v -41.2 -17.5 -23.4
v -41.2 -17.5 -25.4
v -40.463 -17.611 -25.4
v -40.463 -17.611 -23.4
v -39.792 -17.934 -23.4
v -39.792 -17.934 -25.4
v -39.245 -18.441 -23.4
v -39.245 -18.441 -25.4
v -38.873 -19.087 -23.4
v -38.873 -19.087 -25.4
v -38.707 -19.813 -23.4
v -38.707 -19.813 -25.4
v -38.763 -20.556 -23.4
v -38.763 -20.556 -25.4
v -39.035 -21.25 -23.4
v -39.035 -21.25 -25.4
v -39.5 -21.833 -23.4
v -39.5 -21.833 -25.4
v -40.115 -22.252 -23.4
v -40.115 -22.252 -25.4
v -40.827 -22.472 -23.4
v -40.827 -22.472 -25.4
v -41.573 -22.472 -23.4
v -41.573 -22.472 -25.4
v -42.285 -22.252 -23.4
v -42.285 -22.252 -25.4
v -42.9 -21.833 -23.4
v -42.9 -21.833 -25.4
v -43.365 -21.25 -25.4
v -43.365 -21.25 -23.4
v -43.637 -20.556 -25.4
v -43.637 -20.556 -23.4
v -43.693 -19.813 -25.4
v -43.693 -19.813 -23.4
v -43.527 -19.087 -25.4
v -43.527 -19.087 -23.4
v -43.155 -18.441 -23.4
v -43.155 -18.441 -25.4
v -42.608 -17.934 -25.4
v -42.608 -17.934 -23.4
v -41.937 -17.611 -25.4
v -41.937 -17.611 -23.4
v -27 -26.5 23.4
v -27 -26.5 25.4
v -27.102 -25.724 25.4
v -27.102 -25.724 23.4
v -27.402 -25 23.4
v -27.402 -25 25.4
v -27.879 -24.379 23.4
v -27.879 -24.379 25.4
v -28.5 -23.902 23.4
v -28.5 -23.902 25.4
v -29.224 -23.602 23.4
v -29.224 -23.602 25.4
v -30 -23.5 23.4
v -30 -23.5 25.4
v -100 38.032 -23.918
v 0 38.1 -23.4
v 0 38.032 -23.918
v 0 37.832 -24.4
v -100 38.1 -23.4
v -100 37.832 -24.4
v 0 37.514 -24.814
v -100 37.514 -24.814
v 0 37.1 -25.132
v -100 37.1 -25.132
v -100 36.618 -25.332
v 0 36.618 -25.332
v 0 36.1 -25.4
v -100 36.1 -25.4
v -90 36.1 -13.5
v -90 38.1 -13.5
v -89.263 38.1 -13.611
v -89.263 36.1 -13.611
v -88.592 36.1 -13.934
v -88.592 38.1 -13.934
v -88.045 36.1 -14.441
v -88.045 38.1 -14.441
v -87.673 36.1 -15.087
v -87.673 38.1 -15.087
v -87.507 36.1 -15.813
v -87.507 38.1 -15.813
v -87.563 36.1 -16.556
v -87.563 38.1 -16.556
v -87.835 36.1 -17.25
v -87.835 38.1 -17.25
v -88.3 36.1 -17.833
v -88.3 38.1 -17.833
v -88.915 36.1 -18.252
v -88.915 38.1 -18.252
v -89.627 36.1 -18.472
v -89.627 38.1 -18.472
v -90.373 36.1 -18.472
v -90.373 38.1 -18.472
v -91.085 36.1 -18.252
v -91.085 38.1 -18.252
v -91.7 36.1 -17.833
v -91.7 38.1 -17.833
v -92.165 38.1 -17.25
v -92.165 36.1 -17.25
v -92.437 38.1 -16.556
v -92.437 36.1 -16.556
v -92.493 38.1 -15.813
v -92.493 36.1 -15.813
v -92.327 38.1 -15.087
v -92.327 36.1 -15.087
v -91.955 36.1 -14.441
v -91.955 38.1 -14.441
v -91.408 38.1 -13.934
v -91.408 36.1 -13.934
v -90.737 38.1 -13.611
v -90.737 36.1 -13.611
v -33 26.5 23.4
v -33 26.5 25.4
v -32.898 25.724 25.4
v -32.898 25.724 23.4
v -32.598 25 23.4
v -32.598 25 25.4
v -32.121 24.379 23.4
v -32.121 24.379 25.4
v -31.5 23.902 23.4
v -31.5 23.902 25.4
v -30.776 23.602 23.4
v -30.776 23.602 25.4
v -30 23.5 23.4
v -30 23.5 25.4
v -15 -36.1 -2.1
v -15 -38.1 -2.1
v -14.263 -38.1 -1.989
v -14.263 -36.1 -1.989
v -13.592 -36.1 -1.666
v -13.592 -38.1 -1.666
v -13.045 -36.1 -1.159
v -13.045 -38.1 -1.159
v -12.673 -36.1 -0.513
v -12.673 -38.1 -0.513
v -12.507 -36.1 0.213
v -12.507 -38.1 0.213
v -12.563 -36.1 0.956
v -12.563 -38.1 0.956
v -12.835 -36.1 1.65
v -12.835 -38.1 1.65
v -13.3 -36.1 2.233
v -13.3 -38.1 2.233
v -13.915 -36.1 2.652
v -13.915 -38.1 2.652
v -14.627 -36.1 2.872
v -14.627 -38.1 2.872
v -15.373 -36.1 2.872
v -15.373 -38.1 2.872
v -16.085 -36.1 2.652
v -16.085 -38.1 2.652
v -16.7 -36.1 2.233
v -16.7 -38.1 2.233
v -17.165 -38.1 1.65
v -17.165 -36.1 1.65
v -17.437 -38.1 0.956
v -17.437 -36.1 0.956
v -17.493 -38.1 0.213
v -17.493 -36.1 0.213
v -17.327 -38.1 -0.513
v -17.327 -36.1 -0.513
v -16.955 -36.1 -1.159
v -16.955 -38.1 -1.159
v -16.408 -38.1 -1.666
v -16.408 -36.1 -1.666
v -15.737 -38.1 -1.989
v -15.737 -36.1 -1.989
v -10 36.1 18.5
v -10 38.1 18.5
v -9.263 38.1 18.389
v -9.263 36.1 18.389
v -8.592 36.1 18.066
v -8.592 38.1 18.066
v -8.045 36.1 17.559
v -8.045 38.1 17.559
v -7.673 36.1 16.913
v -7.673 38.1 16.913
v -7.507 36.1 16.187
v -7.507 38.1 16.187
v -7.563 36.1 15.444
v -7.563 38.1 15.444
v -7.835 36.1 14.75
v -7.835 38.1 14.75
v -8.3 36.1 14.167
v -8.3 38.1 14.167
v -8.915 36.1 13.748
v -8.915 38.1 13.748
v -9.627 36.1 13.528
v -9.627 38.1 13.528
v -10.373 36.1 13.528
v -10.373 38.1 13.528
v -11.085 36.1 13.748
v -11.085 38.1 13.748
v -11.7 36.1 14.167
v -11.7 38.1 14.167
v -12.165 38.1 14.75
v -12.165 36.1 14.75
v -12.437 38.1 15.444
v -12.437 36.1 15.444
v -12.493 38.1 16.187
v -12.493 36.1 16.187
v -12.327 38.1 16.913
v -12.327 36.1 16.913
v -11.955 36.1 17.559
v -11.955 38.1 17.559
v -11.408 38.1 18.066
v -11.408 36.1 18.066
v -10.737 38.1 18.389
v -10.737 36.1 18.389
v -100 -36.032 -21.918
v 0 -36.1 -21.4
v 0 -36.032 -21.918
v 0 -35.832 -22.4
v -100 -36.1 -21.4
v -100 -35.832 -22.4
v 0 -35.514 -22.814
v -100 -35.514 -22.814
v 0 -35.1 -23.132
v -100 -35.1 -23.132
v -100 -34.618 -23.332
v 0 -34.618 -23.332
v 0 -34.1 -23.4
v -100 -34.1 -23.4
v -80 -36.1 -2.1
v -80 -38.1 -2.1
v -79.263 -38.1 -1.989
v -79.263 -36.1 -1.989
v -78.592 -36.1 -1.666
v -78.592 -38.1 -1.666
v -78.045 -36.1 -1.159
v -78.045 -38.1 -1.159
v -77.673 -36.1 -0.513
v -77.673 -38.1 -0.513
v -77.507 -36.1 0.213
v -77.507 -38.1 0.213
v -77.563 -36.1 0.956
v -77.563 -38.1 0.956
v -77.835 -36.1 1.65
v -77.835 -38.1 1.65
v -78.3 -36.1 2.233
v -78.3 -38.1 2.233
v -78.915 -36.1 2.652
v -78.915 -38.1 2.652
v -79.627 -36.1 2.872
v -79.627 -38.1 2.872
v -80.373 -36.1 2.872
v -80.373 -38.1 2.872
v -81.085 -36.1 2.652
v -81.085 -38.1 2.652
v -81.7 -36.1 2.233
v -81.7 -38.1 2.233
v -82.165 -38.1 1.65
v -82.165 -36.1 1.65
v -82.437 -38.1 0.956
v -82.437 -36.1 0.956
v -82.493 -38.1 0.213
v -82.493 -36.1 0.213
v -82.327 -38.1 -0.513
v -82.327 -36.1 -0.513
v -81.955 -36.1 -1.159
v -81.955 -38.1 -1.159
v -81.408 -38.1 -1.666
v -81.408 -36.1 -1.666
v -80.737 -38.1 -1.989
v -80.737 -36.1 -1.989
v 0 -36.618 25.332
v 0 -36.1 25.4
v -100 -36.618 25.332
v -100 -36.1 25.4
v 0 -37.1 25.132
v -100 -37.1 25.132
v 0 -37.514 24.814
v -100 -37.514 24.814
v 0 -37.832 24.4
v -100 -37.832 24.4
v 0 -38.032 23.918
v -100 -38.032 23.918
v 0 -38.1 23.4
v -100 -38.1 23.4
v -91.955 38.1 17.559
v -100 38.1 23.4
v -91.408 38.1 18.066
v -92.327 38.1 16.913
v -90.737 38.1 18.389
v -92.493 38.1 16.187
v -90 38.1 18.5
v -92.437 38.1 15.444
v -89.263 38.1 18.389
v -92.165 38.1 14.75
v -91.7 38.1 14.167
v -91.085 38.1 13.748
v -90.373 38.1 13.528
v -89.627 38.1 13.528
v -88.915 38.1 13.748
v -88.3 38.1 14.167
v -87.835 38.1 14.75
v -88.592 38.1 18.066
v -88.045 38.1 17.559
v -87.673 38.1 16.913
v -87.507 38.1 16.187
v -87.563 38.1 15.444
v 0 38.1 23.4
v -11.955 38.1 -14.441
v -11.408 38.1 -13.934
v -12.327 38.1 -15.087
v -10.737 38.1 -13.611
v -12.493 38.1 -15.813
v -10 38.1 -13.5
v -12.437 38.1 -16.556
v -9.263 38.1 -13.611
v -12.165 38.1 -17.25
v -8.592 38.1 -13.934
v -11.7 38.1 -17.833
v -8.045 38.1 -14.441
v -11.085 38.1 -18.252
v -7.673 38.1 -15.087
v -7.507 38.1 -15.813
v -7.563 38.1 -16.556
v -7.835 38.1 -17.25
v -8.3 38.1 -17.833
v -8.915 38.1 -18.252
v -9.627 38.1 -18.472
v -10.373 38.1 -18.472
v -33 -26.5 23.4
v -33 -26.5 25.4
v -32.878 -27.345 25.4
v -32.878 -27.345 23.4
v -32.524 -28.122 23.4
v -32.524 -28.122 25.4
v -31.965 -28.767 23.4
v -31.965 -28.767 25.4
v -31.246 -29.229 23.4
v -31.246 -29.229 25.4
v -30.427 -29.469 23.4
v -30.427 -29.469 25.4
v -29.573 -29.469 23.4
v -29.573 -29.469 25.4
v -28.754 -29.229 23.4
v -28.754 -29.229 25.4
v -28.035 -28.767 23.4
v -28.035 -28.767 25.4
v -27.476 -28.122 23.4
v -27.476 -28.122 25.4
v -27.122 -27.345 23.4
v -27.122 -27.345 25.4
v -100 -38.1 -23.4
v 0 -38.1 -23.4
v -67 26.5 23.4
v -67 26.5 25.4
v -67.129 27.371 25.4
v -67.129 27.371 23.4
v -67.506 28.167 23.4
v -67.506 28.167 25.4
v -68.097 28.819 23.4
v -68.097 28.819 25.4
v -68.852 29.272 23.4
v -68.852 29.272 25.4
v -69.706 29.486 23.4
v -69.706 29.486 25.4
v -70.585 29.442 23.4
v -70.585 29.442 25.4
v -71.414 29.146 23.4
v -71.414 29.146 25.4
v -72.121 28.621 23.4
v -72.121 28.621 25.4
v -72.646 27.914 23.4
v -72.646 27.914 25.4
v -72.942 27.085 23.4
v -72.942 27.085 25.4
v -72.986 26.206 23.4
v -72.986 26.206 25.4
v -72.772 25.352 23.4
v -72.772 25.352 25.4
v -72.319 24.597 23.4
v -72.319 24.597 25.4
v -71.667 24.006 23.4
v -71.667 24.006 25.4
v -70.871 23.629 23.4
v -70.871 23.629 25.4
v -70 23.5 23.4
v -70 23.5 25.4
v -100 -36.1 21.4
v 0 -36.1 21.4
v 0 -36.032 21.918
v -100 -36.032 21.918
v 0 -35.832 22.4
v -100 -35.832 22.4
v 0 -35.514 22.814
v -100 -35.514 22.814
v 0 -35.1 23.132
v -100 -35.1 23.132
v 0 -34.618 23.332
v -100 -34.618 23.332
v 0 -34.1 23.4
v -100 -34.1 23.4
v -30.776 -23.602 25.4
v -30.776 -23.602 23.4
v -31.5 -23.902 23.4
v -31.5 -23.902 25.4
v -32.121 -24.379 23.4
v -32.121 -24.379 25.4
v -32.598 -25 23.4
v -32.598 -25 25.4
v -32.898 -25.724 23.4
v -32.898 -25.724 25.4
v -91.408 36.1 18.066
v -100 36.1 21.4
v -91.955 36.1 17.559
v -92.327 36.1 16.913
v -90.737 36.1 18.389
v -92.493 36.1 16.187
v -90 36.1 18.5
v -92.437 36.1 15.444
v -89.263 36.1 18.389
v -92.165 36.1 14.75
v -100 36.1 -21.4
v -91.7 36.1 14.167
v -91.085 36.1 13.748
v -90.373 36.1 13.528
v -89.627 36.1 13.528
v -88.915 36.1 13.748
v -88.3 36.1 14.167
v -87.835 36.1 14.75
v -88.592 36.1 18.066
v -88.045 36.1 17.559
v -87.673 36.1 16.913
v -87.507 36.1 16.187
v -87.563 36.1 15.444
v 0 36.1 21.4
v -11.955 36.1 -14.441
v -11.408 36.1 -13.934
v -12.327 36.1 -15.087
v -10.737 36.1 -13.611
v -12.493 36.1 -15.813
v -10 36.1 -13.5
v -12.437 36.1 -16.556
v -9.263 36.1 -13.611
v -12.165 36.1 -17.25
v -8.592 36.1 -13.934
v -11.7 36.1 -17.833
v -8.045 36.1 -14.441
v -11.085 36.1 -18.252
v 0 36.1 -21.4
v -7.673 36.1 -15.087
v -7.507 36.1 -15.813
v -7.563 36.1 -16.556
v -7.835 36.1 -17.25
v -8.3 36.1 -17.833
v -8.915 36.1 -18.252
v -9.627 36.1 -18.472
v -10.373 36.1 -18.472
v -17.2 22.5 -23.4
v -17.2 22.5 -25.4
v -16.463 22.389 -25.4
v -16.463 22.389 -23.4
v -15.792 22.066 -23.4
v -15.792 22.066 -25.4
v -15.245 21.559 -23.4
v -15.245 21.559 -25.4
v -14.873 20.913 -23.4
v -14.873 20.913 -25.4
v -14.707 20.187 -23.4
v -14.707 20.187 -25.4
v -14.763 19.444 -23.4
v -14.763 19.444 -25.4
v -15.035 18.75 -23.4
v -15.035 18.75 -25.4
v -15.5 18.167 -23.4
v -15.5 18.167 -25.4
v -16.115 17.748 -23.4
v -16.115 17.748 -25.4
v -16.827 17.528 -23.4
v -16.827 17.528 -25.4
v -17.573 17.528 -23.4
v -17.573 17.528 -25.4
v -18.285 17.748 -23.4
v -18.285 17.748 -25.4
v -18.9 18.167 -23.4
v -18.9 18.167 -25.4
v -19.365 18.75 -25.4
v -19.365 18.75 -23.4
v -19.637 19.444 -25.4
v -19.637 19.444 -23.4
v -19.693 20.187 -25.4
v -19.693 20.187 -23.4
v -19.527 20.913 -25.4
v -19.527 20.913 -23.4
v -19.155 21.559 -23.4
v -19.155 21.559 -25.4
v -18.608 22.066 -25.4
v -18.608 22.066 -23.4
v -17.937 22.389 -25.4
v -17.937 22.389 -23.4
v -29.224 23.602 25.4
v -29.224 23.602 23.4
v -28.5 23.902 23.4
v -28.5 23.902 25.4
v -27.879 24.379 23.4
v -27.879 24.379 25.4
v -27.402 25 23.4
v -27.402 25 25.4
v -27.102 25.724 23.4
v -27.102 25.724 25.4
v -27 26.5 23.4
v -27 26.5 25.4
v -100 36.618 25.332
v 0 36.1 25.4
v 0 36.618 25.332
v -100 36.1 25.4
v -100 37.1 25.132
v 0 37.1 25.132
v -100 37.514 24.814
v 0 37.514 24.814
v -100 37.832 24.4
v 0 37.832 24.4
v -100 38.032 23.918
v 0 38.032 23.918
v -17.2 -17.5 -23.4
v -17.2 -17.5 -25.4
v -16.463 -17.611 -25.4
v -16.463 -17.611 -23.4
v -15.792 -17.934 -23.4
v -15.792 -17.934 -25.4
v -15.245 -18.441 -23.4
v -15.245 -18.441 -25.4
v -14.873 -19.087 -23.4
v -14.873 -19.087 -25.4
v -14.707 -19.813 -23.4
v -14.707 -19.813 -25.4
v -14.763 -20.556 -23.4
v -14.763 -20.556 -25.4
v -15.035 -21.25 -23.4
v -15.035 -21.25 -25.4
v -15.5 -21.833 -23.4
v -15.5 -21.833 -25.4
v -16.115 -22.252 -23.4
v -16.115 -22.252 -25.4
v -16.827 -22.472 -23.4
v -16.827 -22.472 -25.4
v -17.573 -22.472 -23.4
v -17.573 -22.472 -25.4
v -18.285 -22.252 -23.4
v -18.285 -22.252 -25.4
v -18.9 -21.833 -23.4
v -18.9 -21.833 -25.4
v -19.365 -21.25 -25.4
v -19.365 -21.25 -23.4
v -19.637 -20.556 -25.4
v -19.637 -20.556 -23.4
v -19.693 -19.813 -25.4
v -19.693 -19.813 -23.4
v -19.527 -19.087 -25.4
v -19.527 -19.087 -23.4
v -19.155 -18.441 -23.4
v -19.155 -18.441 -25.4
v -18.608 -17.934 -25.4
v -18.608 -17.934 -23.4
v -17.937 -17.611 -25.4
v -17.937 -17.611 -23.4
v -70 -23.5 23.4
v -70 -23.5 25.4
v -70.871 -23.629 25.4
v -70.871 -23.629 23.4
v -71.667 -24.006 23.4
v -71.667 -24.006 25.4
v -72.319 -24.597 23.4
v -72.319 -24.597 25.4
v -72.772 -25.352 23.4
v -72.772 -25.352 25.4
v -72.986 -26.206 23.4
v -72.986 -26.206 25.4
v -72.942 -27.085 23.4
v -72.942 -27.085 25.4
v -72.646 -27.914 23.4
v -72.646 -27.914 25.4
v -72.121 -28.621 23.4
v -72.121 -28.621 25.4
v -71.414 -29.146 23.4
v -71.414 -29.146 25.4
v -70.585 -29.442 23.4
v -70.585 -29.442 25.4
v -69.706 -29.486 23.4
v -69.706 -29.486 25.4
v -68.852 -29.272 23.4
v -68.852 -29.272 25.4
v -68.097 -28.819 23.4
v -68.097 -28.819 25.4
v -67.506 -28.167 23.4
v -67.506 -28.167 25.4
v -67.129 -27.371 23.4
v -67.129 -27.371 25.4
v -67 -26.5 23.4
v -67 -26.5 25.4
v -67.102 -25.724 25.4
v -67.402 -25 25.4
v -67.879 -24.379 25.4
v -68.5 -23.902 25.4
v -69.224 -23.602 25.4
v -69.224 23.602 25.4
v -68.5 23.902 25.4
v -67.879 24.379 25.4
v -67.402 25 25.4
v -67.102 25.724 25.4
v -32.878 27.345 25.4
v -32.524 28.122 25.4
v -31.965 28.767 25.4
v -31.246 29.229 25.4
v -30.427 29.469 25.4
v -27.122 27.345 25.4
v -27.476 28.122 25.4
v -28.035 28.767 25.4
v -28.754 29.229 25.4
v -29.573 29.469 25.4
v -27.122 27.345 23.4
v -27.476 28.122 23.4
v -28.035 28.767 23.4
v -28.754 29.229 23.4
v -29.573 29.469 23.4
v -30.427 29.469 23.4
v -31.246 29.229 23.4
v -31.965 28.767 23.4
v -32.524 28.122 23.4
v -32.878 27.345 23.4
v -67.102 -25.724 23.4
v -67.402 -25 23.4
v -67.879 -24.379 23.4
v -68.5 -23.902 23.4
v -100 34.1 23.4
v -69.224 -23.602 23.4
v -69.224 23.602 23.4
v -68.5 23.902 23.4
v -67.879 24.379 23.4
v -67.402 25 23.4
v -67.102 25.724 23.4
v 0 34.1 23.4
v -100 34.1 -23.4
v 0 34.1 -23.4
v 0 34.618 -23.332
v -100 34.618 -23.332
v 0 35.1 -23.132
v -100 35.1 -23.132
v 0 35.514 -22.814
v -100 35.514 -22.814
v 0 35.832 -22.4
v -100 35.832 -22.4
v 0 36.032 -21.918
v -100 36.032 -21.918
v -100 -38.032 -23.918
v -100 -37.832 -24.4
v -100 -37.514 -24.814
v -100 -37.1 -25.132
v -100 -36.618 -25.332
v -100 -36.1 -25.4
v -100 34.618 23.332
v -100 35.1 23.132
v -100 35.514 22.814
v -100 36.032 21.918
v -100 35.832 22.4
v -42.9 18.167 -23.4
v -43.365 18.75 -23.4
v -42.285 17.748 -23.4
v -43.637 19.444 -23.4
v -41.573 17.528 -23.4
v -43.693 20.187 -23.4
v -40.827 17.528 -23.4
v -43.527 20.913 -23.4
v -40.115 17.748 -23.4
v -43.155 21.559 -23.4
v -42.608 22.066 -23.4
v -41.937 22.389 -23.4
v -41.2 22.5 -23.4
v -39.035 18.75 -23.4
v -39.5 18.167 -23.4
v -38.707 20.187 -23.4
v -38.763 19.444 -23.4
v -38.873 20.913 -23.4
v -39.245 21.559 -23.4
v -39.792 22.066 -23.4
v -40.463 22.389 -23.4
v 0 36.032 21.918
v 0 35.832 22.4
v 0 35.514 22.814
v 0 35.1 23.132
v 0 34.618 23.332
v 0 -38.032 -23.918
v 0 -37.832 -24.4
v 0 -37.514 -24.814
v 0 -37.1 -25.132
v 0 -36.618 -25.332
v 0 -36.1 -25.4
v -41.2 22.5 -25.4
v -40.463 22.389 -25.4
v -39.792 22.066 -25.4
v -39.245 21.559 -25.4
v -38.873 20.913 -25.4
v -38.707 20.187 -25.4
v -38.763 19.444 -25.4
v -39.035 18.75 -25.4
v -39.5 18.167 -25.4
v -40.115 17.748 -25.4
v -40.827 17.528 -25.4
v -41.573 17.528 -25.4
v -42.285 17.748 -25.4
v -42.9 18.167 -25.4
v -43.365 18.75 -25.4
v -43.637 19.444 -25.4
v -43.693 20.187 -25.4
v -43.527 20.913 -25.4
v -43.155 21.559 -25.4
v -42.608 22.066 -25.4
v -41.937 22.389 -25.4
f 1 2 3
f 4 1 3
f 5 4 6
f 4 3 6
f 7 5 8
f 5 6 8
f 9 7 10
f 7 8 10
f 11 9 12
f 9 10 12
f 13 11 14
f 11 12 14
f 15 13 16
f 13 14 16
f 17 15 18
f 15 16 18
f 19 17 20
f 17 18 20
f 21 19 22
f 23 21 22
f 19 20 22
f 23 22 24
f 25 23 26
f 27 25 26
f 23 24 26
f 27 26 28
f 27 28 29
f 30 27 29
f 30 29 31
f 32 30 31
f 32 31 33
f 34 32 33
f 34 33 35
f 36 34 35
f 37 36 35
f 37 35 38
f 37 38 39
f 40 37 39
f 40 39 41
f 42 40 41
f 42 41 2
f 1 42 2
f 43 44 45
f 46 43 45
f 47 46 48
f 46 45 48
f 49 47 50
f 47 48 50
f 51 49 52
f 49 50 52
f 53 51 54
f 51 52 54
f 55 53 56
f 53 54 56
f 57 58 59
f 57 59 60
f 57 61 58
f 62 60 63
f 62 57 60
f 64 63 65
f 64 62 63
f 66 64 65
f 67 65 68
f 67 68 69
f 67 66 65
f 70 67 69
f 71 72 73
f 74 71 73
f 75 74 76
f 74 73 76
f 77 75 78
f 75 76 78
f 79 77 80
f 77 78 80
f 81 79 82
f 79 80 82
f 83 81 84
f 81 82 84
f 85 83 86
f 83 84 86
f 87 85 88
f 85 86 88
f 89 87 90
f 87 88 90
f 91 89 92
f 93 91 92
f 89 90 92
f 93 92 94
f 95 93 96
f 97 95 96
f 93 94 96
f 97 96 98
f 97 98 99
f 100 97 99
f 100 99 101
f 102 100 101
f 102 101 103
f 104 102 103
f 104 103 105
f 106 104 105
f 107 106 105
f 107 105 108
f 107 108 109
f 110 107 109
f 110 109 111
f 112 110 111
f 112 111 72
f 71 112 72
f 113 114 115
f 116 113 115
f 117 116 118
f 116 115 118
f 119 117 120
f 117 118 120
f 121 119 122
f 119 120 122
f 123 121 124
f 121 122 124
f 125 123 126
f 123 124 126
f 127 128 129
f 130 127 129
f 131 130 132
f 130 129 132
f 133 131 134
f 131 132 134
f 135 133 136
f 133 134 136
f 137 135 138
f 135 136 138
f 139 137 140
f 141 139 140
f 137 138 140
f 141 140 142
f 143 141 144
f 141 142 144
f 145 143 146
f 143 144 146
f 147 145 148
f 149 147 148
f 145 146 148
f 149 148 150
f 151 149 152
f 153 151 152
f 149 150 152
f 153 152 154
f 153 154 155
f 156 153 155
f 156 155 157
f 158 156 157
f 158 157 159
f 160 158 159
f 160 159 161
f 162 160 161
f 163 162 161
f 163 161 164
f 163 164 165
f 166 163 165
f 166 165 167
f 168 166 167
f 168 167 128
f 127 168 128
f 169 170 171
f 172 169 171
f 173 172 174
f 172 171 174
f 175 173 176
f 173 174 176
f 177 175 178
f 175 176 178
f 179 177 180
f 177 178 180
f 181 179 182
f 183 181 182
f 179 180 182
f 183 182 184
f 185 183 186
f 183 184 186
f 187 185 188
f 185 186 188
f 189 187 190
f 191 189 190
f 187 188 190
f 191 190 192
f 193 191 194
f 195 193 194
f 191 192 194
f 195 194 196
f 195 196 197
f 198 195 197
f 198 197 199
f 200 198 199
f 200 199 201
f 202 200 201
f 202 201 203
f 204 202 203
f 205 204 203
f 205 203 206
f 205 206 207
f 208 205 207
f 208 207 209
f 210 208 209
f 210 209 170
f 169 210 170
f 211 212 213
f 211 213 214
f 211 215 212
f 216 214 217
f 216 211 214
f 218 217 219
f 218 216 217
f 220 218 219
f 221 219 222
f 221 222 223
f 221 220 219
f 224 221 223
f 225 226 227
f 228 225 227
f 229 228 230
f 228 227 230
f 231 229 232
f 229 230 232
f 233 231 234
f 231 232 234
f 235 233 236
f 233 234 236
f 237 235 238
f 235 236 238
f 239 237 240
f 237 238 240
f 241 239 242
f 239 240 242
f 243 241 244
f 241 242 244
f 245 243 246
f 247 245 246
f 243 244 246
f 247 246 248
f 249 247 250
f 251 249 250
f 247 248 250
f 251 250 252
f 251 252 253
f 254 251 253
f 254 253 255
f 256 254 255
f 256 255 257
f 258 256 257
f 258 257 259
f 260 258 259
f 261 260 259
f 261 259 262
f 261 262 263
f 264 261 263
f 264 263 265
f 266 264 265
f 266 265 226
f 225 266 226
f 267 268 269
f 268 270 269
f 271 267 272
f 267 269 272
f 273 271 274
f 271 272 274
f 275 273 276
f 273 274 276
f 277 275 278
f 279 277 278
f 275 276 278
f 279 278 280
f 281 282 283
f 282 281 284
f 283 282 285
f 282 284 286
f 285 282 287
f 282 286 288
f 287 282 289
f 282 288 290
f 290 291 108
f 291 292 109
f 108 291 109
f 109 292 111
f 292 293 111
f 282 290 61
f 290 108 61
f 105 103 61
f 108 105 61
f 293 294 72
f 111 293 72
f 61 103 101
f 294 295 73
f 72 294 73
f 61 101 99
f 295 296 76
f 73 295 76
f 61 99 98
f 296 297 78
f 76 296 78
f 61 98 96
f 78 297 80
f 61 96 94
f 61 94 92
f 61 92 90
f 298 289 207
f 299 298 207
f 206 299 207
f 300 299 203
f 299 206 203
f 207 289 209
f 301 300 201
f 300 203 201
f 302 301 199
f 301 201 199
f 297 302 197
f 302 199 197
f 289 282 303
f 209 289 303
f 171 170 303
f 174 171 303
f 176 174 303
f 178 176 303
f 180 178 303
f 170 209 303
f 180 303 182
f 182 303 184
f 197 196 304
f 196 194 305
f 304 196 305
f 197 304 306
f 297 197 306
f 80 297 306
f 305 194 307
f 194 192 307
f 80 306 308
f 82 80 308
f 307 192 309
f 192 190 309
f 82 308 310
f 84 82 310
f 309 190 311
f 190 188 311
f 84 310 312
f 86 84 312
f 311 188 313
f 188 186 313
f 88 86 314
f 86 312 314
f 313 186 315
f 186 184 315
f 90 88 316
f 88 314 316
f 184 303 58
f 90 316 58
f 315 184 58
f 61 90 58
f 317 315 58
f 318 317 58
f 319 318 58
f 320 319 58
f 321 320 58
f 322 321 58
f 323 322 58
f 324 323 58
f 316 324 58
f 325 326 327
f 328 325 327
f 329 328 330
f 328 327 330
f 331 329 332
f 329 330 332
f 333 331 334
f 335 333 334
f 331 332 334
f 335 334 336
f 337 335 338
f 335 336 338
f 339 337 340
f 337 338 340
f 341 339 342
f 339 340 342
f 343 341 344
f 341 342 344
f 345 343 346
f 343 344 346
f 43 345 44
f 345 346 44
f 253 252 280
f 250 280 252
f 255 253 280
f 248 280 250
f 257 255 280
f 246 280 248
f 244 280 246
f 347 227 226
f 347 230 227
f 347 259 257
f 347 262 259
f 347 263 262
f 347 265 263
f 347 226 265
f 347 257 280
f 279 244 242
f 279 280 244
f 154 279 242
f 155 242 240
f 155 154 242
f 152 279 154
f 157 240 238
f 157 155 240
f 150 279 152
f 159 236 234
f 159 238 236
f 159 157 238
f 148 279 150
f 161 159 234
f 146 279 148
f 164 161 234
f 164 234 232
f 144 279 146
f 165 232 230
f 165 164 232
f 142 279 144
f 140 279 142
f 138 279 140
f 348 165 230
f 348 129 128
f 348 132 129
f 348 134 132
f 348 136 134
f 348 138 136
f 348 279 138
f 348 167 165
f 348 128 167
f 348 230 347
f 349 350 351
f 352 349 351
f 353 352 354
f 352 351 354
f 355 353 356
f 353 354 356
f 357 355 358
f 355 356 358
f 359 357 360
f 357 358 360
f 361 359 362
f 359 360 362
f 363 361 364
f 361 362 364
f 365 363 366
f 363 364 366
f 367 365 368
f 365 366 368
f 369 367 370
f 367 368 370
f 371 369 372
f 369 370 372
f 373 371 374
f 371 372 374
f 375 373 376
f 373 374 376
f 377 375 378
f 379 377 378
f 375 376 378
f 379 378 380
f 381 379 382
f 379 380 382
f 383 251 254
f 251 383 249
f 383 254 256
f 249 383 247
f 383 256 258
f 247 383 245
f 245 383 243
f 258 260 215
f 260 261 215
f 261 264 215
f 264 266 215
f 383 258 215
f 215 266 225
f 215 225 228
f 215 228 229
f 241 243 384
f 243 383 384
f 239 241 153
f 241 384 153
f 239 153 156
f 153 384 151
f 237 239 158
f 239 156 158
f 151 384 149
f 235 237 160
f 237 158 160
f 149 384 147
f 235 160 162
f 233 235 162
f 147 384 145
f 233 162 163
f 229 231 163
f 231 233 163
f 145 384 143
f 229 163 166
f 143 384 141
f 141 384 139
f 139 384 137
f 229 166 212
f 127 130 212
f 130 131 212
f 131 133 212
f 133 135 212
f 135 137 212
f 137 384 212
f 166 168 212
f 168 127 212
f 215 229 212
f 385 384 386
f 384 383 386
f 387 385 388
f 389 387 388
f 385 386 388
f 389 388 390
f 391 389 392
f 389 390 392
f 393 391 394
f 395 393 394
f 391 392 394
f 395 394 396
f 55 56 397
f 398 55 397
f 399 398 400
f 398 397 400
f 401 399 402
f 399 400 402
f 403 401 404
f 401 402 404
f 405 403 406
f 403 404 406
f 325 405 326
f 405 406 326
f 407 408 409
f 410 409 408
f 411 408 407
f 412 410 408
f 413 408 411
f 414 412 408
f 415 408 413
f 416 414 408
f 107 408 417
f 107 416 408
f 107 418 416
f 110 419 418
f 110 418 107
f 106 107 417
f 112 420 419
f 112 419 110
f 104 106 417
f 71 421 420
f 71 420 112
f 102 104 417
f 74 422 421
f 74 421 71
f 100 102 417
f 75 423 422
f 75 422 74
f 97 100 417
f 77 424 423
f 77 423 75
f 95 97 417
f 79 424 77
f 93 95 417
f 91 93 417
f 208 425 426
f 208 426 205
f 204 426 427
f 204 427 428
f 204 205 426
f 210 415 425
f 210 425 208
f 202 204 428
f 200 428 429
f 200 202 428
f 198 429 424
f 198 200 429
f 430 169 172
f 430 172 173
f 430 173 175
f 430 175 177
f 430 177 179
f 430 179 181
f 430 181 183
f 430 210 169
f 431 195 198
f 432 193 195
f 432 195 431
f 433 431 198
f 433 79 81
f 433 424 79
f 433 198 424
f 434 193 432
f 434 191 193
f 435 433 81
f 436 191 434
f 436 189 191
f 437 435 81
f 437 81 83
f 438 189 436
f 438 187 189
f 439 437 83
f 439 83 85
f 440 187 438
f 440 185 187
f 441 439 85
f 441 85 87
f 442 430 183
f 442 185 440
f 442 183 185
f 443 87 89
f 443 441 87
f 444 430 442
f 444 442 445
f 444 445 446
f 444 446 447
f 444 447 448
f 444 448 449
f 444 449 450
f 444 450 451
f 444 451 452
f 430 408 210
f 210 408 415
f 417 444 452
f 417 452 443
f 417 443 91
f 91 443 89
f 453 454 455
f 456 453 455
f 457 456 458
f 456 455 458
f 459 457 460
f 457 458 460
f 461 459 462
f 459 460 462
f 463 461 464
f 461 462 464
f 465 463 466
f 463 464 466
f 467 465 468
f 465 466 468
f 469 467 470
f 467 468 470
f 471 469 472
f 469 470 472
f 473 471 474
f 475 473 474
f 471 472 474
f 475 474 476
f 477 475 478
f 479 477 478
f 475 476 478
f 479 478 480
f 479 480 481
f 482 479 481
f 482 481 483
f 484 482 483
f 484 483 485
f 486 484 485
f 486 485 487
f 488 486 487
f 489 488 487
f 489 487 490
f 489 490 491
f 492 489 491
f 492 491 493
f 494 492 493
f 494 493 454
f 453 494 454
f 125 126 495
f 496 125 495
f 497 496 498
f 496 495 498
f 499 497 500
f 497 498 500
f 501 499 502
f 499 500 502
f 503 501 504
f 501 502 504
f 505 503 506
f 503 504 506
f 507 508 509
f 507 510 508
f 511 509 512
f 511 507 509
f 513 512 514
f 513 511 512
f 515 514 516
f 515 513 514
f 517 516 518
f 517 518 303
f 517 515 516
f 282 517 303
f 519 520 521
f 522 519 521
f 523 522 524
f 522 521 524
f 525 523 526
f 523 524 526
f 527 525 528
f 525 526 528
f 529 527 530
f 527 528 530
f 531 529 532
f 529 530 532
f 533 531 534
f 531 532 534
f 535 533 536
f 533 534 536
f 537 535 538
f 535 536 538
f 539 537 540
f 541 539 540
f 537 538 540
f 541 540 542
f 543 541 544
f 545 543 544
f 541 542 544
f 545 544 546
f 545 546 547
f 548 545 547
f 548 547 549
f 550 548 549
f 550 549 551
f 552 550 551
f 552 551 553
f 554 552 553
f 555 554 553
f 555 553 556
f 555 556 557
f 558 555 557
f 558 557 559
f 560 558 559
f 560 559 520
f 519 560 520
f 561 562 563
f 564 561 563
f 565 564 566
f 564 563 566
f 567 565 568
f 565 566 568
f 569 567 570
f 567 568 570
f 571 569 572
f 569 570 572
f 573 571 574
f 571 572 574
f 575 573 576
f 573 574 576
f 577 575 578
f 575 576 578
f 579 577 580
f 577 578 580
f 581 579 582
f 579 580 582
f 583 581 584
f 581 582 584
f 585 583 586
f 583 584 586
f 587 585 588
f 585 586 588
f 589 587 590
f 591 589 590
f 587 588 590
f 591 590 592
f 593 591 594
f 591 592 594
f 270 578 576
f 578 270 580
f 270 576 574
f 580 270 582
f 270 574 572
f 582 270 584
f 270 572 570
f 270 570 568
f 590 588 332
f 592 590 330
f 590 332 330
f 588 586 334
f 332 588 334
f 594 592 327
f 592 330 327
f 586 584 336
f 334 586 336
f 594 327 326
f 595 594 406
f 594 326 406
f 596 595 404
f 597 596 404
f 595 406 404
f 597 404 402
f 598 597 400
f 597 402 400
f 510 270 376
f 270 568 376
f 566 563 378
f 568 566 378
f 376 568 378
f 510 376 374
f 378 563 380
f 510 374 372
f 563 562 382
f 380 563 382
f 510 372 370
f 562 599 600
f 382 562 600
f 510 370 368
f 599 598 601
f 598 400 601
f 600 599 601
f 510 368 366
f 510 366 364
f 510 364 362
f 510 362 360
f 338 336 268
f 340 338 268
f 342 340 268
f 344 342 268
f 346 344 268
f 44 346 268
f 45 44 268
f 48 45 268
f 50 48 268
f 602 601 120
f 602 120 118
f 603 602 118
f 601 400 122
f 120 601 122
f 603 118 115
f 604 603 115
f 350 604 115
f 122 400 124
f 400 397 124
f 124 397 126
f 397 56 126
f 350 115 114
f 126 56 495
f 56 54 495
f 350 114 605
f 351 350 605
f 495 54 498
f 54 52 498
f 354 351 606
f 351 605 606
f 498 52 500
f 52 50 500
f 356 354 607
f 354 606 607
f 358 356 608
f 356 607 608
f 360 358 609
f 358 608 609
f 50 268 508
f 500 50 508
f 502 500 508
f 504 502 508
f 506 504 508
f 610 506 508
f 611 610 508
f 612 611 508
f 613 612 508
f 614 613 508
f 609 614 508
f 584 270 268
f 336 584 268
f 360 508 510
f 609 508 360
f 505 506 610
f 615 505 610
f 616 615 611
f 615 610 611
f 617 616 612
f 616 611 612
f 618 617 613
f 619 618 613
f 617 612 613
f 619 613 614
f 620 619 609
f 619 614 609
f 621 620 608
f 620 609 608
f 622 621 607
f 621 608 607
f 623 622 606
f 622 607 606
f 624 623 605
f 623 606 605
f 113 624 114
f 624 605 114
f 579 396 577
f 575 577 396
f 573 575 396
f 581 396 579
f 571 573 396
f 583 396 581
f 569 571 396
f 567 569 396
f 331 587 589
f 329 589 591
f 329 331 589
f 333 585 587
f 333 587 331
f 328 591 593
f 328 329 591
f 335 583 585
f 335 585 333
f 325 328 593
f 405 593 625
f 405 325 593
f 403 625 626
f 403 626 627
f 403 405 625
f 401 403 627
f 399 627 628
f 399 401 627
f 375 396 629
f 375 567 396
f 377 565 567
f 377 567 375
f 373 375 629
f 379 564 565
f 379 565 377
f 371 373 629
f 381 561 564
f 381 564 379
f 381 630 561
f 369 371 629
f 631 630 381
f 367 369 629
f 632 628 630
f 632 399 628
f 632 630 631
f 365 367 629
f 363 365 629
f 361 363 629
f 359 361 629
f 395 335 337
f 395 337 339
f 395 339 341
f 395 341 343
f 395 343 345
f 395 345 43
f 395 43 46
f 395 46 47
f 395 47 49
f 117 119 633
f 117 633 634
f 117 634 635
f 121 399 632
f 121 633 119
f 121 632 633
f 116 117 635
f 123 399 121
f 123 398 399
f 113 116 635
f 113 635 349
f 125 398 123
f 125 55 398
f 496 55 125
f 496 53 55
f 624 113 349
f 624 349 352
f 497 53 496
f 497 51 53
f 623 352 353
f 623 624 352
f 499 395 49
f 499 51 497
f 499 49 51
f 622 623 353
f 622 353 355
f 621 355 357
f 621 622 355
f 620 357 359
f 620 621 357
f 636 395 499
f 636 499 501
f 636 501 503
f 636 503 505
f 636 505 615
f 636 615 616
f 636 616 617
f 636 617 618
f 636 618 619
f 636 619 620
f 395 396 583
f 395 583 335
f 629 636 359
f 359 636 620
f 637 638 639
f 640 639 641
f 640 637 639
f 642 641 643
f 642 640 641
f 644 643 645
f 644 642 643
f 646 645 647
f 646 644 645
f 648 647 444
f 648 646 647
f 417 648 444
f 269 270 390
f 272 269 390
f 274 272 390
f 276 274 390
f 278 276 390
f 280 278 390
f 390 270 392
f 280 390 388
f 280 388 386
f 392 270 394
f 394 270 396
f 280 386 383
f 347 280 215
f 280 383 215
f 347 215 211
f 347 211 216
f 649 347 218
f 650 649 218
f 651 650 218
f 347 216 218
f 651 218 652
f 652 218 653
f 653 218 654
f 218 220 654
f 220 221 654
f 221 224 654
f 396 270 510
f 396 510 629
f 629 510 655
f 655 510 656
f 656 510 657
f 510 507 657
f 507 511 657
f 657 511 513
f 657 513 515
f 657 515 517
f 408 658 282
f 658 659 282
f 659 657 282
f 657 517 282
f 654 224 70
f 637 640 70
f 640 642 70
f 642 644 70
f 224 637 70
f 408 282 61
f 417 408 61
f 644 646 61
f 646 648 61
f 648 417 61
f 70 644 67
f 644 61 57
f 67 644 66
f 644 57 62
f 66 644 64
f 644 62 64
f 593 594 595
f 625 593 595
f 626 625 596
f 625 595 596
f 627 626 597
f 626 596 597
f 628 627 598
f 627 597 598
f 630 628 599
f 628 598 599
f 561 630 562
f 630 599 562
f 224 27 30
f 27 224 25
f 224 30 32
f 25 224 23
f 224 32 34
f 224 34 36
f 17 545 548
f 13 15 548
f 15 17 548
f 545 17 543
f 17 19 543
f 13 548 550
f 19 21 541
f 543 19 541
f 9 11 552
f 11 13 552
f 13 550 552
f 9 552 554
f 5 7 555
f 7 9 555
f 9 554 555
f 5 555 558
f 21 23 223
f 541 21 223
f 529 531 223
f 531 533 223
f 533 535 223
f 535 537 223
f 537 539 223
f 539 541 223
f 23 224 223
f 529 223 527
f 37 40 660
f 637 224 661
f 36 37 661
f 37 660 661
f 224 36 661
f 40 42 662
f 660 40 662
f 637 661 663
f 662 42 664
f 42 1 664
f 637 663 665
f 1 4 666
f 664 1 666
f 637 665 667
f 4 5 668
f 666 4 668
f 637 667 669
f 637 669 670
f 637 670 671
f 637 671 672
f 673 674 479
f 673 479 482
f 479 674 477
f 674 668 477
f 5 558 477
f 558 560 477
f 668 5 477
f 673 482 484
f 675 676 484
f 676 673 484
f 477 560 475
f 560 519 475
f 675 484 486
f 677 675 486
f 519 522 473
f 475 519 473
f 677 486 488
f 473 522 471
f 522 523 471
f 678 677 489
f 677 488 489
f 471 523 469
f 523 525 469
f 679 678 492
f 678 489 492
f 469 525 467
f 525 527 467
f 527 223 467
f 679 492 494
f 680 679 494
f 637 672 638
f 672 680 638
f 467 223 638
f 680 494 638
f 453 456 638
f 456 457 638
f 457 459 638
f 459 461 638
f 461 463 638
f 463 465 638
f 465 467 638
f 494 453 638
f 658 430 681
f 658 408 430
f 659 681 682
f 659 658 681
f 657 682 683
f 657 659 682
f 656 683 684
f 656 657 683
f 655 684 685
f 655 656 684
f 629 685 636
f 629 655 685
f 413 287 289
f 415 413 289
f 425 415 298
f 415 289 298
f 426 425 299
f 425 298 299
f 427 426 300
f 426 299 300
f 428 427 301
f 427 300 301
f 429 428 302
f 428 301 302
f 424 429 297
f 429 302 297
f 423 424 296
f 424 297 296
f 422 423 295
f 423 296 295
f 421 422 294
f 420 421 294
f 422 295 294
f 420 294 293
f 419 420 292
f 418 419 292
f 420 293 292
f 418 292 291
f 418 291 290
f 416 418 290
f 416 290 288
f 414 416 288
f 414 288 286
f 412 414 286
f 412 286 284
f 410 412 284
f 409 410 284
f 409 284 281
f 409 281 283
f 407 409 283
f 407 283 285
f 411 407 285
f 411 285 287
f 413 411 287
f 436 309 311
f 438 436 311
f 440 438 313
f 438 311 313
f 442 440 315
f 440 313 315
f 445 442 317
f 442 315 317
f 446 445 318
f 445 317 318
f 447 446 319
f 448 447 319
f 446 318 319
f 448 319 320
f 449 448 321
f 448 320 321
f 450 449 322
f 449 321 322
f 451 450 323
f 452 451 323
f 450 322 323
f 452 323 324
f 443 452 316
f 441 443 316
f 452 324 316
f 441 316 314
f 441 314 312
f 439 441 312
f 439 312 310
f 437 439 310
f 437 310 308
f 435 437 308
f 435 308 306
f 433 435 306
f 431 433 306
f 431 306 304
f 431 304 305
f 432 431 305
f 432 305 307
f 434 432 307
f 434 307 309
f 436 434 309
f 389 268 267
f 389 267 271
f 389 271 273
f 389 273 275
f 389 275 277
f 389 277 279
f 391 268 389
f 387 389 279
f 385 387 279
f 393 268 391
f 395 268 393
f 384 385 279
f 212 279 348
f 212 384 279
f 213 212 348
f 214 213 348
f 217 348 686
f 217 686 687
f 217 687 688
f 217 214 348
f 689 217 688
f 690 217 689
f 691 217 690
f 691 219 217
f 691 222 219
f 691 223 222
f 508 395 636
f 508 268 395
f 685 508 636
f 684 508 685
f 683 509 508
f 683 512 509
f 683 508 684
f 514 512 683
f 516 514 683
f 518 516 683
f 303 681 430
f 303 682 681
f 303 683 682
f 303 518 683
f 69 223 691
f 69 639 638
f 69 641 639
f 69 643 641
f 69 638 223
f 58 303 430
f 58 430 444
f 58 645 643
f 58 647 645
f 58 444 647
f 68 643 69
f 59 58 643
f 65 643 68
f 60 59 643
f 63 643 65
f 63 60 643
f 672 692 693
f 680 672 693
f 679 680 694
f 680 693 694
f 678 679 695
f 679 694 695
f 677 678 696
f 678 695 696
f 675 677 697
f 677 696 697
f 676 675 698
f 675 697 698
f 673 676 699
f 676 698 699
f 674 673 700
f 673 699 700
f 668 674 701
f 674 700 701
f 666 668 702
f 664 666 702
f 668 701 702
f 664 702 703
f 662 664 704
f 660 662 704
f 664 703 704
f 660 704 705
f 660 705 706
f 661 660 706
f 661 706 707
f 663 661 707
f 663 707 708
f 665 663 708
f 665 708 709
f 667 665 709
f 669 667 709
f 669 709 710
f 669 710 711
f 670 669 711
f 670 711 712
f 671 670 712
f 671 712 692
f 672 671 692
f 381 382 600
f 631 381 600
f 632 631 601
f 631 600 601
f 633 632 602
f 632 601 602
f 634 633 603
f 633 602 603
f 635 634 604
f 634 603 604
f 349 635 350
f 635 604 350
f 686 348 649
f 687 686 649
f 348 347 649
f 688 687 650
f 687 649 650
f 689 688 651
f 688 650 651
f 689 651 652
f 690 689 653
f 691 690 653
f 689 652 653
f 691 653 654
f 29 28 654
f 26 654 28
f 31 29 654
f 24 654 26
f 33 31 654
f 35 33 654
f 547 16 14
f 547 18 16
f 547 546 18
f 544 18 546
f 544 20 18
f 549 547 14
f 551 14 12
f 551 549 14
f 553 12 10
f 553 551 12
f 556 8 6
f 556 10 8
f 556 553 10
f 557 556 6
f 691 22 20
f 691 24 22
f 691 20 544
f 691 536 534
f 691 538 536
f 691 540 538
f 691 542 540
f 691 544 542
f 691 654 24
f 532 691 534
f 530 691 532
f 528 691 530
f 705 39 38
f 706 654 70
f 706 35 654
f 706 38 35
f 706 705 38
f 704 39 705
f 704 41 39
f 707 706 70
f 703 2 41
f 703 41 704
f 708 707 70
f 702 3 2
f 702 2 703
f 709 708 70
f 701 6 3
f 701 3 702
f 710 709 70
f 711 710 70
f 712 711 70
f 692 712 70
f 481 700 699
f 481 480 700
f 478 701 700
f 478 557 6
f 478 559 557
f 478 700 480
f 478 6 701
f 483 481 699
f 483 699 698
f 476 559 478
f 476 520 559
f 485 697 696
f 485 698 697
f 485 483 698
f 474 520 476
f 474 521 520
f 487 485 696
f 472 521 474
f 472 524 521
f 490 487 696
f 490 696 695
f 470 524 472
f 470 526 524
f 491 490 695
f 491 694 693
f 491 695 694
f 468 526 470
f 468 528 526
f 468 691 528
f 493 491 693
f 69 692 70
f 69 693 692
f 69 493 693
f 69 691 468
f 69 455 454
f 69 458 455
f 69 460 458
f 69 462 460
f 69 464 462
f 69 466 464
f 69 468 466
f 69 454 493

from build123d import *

# Parameters (mm, degrees)
SKETCH1_W             = 50.8
SKETCH1_H             = 76.2
BOSS_EXTRUDE1_DEPTH   = 100
SKETCH2_W             = 46.8
SKETCH2_H             = 72.2
CUT_EXTRUDE1_DEPTH    = 110.985317202
FILLET2_R             = 2
CORTAR_EXTRUIR2_DEPTH = 10
CROQUIS6_R            = 2.5
CORTAR_EXTRUIR6_DEPTH = 10
CROQUIS7_R            = 2.5
CORTAR_EXTRUIR7_DEPTH = 10
CROQUIS8_R            = 2.5
CORTAR_EXTRUIR8_DEPTH = 10


with BuildPart() as part:
    # Sketch1 → Boss-Extrude1 (new body)
    with BuildSketch(Plane(origin=(0, 0, 0), x_dir=(0, 0, -1), z_dir=(1, 0, 0))):
        Rectangle(SKETCH1_W, SKETCH1_H)
    extrude(amount=-BOSS_EXTRUDE1_DEPTH)

    # Sketch2 → Cut-Extrude1 (cut, through all)
    with BuildSketch(Plane(origin=(0, 0, 0), x_dir=(0, 0, -1), z_dir=(1, 0, 0))):
        Rectangle(SKETCH2_W, SKETCH2_H)
    extrude(amount=-CUT_EXTRUDE1_DEPTH, mode=Mode.SUBTRACT)

    # Fillet2
    fillet2_edges = [part.edges().sort_by_distance(p)[0] for p in [
        (-50, -36.1, 23.4),
        (-50, 36.1, 23.4),
        (-50, 36.1, -23.4),
        (-50, -36.1, -23.4),
        (-50, 38.1, 25.4),
        (-50, 38.1, -25.4),
        (-50, -38.1, -25.4),
        (-50, -38.1, 25.4),
    ]]
    fillet(fillet2_edges, radius=FILLET2_R)

    # Croquis2 → Cortar-Extruir2 (cut)
    with BuildSketch(Plane.XY.offset(25.4)):
        with BuildLine():
            ThreePointArc((-27, 26.5), (-30, 29.5), (-33, 26.5))
            Line((-33, 26.5), (-30, 26.5))
            Line((-30, 26.5), (-30, 23.5))
            ThreePointArc((-30, 23.5), (-27.878679656, 24.378679656), (-27, 26.5))
        make_face()
        with BuildLine():
            Line((-30, 26.5), (-33, 26.5))
            ThreePointArc((-33, 26.5), (-32.121320344, 24.378679656), (-30, 23.5))
            Line((-30, 23.5), (-30, 26.5))
        make_face()
        with BuildLine():
            ThreePointArc((-70, 23.5), (-67.878679656, 24.378679656), (-67, 26.5))
            Line((-67, 26.5), (-70, 26.5))
            Line((-70, 26.5), (-70, 23.5))
        make_face()
        with BuildLine():
            Line((-70, 26.5), (-67, 26.5))
            ThreePointArc((-67, 26.5), (-72.121320344, 28.621320344), (-70, 23.5))
            Line((-70, 23.5), (-70, 26.5))
        make_face()
        with BuildLine():
            ThreePointArc((-67, -26.5), (-67.878679656, -24.378679656), (-70, -23.5))
            Line((-70, -23.5), (-70, -26.5))
            Line((-70, -26.5), (-67, -26.5))
        make_face()
        with BuildLine():
            Line((-70, -26.5), (-70, -23.5))
            ThreePointArc((-70, -23.5), (-72.121320344, -28.621320344), (-67, -26.5))
            Line((-67, -26.5), (-70, -26.5))
        make_face()
        with BuildLine():
            ThreePointArc((-27, -26.5), (-27.878679656, -24.378679656), (-30, -23.5))
            Line((-30, -23.5), (-30, -26.5))
            Line((-30, -26.5), (-33, -26.5))
            ThreePointArc((-33, -26.5), (-30, -29.5), (-27, -26.5))
        make_face()
        with BuildLine():
            Line((-30, -26.5), (-30, -23.5))
            ThreePointArc((-30, -23.5), (-32.121320344, -24.378679656), (-33, -26.5))
            Line((-33, -26.5), (-30, -26.5))
        make_face()
    extrude(amount=-CORTAR_EXTRUIR2_DEPTH, mode=Mode.SUBTRACT)

    # Croquis6 → Cortar-Extruir6 (cut)
    with BuildSketch(Plane(origin=(0, 0, -25.4), x_dir=(-1, 0, 0), z_dir=(0, 0, -1))):
        with Locations(Location((17.2, 20, 0), (0, 0, 90))):
            Circle(CROQUIS6_R)
        with Locations(Location((17.2, -20, 0), (0, 0, 90))):
            Circle(CROQUIS6_R)
        with Locations(Location((41.2, -20, 0), (0, 0, 90))):
            Circle(CROQUIS6_R)
        with Locations(Location((41.2, 20, 0), (0, 0, 90))):
            Circle(CROQUIS6_R)
    extrude(amount=-CORTAR_EXTRUIR6_DEPTH, mode=Mode.SUBTRACT)

    # Croquis7 → Cortar-Extruir7 (cut)
    with BuildSketch(Plane.XZ.offset(38.1)):
        with Locations(Location((-15, 0.4, 0), (0, 0, 270))):
            Circle(CROQUIS7_R)
        with Locations(Location((-80, 0.4, 0), (0, 0, 270))):
            Circle(CROQUIS7_R)
    extrude(amount=-CORTAR_EXTRUIR7_DEPTH, mode=Mode.SUBTRACT)

    # Croquis8 → Cortar-Extruir8 (cut)
    with BuildSketch(Plane(origin=(0, 38.1, 0), x_dir=(1, 0, 0), z_dir=(0, 1, 0))):
        with Locations(Location((-90, 16, 0), (0, 0, 270))):
            Circle(CROQUIS8_R)
        with Locations(Location((-10, 16, 0), (0, 0, 270))):
            Circle(CROQUIS8_R)
        with Locations(Location((-90, -16, 0), (0, 0, 270))):
            Circle(CROQUIS8_R)
        with Locations(Location((-10, -16, 0), (0, 0, 270))):
            Circle(CROQUIS8_R)
    extrude(amount=-CORTAR_EXTRUIR8_DEPTH, mode=Mode.SUBTRACT)


solid = part.part
